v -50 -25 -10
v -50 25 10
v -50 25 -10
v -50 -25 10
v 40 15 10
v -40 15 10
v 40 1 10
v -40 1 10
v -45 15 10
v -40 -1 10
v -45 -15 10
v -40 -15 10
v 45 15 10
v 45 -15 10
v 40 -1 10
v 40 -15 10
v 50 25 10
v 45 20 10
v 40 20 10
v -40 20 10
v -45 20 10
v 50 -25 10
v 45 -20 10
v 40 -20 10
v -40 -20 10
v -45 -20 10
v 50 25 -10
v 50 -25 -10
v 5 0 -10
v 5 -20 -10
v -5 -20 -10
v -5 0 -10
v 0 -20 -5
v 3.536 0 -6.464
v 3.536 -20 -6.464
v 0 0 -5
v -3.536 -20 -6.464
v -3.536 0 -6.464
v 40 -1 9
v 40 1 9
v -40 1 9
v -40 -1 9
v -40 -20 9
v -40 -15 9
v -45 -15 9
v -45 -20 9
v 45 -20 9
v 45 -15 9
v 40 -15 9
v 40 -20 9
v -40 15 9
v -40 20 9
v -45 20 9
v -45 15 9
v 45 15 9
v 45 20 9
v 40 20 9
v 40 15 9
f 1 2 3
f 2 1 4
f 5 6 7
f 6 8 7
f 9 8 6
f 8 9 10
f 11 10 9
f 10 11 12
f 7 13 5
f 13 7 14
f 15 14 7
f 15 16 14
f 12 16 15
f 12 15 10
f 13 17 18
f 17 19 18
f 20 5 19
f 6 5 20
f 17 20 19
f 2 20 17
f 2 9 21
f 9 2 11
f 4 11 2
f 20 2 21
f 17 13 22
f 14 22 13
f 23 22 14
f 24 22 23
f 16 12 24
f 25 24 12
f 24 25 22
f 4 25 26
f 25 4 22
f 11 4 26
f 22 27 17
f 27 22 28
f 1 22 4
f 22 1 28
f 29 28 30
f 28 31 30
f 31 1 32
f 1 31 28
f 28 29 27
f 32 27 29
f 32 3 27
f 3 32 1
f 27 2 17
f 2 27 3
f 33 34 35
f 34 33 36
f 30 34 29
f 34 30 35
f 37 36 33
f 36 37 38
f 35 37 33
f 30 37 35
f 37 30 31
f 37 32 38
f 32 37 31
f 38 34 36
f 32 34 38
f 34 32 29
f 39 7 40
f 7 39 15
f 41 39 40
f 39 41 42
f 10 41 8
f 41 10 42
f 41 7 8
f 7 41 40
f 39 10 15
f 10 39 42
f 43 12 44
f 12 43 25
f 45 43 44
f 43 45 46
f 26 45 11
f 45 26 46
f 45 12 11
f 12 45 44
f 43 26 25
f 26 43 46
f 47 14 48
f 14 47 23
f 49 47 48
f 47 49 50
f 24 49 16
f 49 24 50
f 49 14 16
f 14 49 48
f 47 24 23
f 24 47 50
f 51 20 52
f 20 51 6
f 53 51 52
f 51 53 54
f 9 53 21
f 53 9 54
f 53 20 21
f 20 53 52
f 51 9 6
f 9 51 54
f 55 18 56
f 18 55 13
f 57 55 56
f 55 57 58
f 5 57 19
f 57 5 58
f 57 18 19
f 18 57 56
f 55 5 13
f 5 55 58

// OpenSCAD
module chamfered_block() {
    difference() {
        // Main block with chamfered corners
        hull() {
            translate([-50, -25, -10]) cube([100, 50, 20]);
            translate([-45, -20, -10]) cube([90, 40, 20]);
        }
        
        // Octagonal bore
        translate([0, 0, -10]) rotate([90, 0, 0]) cylinder(h=20, r=5, $fn=8);
        
        // Long narrow recessed slot
        translate([-40, -1, 9]) cube([80, 2, 2]);
        
        // Four small square recesses
        translate([-45, -20, 9]) cube([5, 5, 2]);
        translate([40, -20, 9]) cube([5, 5, 2]);
        translate([-45, 15, 9]) cube([5, 5, 2]);
        translate([40, 15, 9]) cube([5, 5, 2]);
    }
}

chamfered_block();
